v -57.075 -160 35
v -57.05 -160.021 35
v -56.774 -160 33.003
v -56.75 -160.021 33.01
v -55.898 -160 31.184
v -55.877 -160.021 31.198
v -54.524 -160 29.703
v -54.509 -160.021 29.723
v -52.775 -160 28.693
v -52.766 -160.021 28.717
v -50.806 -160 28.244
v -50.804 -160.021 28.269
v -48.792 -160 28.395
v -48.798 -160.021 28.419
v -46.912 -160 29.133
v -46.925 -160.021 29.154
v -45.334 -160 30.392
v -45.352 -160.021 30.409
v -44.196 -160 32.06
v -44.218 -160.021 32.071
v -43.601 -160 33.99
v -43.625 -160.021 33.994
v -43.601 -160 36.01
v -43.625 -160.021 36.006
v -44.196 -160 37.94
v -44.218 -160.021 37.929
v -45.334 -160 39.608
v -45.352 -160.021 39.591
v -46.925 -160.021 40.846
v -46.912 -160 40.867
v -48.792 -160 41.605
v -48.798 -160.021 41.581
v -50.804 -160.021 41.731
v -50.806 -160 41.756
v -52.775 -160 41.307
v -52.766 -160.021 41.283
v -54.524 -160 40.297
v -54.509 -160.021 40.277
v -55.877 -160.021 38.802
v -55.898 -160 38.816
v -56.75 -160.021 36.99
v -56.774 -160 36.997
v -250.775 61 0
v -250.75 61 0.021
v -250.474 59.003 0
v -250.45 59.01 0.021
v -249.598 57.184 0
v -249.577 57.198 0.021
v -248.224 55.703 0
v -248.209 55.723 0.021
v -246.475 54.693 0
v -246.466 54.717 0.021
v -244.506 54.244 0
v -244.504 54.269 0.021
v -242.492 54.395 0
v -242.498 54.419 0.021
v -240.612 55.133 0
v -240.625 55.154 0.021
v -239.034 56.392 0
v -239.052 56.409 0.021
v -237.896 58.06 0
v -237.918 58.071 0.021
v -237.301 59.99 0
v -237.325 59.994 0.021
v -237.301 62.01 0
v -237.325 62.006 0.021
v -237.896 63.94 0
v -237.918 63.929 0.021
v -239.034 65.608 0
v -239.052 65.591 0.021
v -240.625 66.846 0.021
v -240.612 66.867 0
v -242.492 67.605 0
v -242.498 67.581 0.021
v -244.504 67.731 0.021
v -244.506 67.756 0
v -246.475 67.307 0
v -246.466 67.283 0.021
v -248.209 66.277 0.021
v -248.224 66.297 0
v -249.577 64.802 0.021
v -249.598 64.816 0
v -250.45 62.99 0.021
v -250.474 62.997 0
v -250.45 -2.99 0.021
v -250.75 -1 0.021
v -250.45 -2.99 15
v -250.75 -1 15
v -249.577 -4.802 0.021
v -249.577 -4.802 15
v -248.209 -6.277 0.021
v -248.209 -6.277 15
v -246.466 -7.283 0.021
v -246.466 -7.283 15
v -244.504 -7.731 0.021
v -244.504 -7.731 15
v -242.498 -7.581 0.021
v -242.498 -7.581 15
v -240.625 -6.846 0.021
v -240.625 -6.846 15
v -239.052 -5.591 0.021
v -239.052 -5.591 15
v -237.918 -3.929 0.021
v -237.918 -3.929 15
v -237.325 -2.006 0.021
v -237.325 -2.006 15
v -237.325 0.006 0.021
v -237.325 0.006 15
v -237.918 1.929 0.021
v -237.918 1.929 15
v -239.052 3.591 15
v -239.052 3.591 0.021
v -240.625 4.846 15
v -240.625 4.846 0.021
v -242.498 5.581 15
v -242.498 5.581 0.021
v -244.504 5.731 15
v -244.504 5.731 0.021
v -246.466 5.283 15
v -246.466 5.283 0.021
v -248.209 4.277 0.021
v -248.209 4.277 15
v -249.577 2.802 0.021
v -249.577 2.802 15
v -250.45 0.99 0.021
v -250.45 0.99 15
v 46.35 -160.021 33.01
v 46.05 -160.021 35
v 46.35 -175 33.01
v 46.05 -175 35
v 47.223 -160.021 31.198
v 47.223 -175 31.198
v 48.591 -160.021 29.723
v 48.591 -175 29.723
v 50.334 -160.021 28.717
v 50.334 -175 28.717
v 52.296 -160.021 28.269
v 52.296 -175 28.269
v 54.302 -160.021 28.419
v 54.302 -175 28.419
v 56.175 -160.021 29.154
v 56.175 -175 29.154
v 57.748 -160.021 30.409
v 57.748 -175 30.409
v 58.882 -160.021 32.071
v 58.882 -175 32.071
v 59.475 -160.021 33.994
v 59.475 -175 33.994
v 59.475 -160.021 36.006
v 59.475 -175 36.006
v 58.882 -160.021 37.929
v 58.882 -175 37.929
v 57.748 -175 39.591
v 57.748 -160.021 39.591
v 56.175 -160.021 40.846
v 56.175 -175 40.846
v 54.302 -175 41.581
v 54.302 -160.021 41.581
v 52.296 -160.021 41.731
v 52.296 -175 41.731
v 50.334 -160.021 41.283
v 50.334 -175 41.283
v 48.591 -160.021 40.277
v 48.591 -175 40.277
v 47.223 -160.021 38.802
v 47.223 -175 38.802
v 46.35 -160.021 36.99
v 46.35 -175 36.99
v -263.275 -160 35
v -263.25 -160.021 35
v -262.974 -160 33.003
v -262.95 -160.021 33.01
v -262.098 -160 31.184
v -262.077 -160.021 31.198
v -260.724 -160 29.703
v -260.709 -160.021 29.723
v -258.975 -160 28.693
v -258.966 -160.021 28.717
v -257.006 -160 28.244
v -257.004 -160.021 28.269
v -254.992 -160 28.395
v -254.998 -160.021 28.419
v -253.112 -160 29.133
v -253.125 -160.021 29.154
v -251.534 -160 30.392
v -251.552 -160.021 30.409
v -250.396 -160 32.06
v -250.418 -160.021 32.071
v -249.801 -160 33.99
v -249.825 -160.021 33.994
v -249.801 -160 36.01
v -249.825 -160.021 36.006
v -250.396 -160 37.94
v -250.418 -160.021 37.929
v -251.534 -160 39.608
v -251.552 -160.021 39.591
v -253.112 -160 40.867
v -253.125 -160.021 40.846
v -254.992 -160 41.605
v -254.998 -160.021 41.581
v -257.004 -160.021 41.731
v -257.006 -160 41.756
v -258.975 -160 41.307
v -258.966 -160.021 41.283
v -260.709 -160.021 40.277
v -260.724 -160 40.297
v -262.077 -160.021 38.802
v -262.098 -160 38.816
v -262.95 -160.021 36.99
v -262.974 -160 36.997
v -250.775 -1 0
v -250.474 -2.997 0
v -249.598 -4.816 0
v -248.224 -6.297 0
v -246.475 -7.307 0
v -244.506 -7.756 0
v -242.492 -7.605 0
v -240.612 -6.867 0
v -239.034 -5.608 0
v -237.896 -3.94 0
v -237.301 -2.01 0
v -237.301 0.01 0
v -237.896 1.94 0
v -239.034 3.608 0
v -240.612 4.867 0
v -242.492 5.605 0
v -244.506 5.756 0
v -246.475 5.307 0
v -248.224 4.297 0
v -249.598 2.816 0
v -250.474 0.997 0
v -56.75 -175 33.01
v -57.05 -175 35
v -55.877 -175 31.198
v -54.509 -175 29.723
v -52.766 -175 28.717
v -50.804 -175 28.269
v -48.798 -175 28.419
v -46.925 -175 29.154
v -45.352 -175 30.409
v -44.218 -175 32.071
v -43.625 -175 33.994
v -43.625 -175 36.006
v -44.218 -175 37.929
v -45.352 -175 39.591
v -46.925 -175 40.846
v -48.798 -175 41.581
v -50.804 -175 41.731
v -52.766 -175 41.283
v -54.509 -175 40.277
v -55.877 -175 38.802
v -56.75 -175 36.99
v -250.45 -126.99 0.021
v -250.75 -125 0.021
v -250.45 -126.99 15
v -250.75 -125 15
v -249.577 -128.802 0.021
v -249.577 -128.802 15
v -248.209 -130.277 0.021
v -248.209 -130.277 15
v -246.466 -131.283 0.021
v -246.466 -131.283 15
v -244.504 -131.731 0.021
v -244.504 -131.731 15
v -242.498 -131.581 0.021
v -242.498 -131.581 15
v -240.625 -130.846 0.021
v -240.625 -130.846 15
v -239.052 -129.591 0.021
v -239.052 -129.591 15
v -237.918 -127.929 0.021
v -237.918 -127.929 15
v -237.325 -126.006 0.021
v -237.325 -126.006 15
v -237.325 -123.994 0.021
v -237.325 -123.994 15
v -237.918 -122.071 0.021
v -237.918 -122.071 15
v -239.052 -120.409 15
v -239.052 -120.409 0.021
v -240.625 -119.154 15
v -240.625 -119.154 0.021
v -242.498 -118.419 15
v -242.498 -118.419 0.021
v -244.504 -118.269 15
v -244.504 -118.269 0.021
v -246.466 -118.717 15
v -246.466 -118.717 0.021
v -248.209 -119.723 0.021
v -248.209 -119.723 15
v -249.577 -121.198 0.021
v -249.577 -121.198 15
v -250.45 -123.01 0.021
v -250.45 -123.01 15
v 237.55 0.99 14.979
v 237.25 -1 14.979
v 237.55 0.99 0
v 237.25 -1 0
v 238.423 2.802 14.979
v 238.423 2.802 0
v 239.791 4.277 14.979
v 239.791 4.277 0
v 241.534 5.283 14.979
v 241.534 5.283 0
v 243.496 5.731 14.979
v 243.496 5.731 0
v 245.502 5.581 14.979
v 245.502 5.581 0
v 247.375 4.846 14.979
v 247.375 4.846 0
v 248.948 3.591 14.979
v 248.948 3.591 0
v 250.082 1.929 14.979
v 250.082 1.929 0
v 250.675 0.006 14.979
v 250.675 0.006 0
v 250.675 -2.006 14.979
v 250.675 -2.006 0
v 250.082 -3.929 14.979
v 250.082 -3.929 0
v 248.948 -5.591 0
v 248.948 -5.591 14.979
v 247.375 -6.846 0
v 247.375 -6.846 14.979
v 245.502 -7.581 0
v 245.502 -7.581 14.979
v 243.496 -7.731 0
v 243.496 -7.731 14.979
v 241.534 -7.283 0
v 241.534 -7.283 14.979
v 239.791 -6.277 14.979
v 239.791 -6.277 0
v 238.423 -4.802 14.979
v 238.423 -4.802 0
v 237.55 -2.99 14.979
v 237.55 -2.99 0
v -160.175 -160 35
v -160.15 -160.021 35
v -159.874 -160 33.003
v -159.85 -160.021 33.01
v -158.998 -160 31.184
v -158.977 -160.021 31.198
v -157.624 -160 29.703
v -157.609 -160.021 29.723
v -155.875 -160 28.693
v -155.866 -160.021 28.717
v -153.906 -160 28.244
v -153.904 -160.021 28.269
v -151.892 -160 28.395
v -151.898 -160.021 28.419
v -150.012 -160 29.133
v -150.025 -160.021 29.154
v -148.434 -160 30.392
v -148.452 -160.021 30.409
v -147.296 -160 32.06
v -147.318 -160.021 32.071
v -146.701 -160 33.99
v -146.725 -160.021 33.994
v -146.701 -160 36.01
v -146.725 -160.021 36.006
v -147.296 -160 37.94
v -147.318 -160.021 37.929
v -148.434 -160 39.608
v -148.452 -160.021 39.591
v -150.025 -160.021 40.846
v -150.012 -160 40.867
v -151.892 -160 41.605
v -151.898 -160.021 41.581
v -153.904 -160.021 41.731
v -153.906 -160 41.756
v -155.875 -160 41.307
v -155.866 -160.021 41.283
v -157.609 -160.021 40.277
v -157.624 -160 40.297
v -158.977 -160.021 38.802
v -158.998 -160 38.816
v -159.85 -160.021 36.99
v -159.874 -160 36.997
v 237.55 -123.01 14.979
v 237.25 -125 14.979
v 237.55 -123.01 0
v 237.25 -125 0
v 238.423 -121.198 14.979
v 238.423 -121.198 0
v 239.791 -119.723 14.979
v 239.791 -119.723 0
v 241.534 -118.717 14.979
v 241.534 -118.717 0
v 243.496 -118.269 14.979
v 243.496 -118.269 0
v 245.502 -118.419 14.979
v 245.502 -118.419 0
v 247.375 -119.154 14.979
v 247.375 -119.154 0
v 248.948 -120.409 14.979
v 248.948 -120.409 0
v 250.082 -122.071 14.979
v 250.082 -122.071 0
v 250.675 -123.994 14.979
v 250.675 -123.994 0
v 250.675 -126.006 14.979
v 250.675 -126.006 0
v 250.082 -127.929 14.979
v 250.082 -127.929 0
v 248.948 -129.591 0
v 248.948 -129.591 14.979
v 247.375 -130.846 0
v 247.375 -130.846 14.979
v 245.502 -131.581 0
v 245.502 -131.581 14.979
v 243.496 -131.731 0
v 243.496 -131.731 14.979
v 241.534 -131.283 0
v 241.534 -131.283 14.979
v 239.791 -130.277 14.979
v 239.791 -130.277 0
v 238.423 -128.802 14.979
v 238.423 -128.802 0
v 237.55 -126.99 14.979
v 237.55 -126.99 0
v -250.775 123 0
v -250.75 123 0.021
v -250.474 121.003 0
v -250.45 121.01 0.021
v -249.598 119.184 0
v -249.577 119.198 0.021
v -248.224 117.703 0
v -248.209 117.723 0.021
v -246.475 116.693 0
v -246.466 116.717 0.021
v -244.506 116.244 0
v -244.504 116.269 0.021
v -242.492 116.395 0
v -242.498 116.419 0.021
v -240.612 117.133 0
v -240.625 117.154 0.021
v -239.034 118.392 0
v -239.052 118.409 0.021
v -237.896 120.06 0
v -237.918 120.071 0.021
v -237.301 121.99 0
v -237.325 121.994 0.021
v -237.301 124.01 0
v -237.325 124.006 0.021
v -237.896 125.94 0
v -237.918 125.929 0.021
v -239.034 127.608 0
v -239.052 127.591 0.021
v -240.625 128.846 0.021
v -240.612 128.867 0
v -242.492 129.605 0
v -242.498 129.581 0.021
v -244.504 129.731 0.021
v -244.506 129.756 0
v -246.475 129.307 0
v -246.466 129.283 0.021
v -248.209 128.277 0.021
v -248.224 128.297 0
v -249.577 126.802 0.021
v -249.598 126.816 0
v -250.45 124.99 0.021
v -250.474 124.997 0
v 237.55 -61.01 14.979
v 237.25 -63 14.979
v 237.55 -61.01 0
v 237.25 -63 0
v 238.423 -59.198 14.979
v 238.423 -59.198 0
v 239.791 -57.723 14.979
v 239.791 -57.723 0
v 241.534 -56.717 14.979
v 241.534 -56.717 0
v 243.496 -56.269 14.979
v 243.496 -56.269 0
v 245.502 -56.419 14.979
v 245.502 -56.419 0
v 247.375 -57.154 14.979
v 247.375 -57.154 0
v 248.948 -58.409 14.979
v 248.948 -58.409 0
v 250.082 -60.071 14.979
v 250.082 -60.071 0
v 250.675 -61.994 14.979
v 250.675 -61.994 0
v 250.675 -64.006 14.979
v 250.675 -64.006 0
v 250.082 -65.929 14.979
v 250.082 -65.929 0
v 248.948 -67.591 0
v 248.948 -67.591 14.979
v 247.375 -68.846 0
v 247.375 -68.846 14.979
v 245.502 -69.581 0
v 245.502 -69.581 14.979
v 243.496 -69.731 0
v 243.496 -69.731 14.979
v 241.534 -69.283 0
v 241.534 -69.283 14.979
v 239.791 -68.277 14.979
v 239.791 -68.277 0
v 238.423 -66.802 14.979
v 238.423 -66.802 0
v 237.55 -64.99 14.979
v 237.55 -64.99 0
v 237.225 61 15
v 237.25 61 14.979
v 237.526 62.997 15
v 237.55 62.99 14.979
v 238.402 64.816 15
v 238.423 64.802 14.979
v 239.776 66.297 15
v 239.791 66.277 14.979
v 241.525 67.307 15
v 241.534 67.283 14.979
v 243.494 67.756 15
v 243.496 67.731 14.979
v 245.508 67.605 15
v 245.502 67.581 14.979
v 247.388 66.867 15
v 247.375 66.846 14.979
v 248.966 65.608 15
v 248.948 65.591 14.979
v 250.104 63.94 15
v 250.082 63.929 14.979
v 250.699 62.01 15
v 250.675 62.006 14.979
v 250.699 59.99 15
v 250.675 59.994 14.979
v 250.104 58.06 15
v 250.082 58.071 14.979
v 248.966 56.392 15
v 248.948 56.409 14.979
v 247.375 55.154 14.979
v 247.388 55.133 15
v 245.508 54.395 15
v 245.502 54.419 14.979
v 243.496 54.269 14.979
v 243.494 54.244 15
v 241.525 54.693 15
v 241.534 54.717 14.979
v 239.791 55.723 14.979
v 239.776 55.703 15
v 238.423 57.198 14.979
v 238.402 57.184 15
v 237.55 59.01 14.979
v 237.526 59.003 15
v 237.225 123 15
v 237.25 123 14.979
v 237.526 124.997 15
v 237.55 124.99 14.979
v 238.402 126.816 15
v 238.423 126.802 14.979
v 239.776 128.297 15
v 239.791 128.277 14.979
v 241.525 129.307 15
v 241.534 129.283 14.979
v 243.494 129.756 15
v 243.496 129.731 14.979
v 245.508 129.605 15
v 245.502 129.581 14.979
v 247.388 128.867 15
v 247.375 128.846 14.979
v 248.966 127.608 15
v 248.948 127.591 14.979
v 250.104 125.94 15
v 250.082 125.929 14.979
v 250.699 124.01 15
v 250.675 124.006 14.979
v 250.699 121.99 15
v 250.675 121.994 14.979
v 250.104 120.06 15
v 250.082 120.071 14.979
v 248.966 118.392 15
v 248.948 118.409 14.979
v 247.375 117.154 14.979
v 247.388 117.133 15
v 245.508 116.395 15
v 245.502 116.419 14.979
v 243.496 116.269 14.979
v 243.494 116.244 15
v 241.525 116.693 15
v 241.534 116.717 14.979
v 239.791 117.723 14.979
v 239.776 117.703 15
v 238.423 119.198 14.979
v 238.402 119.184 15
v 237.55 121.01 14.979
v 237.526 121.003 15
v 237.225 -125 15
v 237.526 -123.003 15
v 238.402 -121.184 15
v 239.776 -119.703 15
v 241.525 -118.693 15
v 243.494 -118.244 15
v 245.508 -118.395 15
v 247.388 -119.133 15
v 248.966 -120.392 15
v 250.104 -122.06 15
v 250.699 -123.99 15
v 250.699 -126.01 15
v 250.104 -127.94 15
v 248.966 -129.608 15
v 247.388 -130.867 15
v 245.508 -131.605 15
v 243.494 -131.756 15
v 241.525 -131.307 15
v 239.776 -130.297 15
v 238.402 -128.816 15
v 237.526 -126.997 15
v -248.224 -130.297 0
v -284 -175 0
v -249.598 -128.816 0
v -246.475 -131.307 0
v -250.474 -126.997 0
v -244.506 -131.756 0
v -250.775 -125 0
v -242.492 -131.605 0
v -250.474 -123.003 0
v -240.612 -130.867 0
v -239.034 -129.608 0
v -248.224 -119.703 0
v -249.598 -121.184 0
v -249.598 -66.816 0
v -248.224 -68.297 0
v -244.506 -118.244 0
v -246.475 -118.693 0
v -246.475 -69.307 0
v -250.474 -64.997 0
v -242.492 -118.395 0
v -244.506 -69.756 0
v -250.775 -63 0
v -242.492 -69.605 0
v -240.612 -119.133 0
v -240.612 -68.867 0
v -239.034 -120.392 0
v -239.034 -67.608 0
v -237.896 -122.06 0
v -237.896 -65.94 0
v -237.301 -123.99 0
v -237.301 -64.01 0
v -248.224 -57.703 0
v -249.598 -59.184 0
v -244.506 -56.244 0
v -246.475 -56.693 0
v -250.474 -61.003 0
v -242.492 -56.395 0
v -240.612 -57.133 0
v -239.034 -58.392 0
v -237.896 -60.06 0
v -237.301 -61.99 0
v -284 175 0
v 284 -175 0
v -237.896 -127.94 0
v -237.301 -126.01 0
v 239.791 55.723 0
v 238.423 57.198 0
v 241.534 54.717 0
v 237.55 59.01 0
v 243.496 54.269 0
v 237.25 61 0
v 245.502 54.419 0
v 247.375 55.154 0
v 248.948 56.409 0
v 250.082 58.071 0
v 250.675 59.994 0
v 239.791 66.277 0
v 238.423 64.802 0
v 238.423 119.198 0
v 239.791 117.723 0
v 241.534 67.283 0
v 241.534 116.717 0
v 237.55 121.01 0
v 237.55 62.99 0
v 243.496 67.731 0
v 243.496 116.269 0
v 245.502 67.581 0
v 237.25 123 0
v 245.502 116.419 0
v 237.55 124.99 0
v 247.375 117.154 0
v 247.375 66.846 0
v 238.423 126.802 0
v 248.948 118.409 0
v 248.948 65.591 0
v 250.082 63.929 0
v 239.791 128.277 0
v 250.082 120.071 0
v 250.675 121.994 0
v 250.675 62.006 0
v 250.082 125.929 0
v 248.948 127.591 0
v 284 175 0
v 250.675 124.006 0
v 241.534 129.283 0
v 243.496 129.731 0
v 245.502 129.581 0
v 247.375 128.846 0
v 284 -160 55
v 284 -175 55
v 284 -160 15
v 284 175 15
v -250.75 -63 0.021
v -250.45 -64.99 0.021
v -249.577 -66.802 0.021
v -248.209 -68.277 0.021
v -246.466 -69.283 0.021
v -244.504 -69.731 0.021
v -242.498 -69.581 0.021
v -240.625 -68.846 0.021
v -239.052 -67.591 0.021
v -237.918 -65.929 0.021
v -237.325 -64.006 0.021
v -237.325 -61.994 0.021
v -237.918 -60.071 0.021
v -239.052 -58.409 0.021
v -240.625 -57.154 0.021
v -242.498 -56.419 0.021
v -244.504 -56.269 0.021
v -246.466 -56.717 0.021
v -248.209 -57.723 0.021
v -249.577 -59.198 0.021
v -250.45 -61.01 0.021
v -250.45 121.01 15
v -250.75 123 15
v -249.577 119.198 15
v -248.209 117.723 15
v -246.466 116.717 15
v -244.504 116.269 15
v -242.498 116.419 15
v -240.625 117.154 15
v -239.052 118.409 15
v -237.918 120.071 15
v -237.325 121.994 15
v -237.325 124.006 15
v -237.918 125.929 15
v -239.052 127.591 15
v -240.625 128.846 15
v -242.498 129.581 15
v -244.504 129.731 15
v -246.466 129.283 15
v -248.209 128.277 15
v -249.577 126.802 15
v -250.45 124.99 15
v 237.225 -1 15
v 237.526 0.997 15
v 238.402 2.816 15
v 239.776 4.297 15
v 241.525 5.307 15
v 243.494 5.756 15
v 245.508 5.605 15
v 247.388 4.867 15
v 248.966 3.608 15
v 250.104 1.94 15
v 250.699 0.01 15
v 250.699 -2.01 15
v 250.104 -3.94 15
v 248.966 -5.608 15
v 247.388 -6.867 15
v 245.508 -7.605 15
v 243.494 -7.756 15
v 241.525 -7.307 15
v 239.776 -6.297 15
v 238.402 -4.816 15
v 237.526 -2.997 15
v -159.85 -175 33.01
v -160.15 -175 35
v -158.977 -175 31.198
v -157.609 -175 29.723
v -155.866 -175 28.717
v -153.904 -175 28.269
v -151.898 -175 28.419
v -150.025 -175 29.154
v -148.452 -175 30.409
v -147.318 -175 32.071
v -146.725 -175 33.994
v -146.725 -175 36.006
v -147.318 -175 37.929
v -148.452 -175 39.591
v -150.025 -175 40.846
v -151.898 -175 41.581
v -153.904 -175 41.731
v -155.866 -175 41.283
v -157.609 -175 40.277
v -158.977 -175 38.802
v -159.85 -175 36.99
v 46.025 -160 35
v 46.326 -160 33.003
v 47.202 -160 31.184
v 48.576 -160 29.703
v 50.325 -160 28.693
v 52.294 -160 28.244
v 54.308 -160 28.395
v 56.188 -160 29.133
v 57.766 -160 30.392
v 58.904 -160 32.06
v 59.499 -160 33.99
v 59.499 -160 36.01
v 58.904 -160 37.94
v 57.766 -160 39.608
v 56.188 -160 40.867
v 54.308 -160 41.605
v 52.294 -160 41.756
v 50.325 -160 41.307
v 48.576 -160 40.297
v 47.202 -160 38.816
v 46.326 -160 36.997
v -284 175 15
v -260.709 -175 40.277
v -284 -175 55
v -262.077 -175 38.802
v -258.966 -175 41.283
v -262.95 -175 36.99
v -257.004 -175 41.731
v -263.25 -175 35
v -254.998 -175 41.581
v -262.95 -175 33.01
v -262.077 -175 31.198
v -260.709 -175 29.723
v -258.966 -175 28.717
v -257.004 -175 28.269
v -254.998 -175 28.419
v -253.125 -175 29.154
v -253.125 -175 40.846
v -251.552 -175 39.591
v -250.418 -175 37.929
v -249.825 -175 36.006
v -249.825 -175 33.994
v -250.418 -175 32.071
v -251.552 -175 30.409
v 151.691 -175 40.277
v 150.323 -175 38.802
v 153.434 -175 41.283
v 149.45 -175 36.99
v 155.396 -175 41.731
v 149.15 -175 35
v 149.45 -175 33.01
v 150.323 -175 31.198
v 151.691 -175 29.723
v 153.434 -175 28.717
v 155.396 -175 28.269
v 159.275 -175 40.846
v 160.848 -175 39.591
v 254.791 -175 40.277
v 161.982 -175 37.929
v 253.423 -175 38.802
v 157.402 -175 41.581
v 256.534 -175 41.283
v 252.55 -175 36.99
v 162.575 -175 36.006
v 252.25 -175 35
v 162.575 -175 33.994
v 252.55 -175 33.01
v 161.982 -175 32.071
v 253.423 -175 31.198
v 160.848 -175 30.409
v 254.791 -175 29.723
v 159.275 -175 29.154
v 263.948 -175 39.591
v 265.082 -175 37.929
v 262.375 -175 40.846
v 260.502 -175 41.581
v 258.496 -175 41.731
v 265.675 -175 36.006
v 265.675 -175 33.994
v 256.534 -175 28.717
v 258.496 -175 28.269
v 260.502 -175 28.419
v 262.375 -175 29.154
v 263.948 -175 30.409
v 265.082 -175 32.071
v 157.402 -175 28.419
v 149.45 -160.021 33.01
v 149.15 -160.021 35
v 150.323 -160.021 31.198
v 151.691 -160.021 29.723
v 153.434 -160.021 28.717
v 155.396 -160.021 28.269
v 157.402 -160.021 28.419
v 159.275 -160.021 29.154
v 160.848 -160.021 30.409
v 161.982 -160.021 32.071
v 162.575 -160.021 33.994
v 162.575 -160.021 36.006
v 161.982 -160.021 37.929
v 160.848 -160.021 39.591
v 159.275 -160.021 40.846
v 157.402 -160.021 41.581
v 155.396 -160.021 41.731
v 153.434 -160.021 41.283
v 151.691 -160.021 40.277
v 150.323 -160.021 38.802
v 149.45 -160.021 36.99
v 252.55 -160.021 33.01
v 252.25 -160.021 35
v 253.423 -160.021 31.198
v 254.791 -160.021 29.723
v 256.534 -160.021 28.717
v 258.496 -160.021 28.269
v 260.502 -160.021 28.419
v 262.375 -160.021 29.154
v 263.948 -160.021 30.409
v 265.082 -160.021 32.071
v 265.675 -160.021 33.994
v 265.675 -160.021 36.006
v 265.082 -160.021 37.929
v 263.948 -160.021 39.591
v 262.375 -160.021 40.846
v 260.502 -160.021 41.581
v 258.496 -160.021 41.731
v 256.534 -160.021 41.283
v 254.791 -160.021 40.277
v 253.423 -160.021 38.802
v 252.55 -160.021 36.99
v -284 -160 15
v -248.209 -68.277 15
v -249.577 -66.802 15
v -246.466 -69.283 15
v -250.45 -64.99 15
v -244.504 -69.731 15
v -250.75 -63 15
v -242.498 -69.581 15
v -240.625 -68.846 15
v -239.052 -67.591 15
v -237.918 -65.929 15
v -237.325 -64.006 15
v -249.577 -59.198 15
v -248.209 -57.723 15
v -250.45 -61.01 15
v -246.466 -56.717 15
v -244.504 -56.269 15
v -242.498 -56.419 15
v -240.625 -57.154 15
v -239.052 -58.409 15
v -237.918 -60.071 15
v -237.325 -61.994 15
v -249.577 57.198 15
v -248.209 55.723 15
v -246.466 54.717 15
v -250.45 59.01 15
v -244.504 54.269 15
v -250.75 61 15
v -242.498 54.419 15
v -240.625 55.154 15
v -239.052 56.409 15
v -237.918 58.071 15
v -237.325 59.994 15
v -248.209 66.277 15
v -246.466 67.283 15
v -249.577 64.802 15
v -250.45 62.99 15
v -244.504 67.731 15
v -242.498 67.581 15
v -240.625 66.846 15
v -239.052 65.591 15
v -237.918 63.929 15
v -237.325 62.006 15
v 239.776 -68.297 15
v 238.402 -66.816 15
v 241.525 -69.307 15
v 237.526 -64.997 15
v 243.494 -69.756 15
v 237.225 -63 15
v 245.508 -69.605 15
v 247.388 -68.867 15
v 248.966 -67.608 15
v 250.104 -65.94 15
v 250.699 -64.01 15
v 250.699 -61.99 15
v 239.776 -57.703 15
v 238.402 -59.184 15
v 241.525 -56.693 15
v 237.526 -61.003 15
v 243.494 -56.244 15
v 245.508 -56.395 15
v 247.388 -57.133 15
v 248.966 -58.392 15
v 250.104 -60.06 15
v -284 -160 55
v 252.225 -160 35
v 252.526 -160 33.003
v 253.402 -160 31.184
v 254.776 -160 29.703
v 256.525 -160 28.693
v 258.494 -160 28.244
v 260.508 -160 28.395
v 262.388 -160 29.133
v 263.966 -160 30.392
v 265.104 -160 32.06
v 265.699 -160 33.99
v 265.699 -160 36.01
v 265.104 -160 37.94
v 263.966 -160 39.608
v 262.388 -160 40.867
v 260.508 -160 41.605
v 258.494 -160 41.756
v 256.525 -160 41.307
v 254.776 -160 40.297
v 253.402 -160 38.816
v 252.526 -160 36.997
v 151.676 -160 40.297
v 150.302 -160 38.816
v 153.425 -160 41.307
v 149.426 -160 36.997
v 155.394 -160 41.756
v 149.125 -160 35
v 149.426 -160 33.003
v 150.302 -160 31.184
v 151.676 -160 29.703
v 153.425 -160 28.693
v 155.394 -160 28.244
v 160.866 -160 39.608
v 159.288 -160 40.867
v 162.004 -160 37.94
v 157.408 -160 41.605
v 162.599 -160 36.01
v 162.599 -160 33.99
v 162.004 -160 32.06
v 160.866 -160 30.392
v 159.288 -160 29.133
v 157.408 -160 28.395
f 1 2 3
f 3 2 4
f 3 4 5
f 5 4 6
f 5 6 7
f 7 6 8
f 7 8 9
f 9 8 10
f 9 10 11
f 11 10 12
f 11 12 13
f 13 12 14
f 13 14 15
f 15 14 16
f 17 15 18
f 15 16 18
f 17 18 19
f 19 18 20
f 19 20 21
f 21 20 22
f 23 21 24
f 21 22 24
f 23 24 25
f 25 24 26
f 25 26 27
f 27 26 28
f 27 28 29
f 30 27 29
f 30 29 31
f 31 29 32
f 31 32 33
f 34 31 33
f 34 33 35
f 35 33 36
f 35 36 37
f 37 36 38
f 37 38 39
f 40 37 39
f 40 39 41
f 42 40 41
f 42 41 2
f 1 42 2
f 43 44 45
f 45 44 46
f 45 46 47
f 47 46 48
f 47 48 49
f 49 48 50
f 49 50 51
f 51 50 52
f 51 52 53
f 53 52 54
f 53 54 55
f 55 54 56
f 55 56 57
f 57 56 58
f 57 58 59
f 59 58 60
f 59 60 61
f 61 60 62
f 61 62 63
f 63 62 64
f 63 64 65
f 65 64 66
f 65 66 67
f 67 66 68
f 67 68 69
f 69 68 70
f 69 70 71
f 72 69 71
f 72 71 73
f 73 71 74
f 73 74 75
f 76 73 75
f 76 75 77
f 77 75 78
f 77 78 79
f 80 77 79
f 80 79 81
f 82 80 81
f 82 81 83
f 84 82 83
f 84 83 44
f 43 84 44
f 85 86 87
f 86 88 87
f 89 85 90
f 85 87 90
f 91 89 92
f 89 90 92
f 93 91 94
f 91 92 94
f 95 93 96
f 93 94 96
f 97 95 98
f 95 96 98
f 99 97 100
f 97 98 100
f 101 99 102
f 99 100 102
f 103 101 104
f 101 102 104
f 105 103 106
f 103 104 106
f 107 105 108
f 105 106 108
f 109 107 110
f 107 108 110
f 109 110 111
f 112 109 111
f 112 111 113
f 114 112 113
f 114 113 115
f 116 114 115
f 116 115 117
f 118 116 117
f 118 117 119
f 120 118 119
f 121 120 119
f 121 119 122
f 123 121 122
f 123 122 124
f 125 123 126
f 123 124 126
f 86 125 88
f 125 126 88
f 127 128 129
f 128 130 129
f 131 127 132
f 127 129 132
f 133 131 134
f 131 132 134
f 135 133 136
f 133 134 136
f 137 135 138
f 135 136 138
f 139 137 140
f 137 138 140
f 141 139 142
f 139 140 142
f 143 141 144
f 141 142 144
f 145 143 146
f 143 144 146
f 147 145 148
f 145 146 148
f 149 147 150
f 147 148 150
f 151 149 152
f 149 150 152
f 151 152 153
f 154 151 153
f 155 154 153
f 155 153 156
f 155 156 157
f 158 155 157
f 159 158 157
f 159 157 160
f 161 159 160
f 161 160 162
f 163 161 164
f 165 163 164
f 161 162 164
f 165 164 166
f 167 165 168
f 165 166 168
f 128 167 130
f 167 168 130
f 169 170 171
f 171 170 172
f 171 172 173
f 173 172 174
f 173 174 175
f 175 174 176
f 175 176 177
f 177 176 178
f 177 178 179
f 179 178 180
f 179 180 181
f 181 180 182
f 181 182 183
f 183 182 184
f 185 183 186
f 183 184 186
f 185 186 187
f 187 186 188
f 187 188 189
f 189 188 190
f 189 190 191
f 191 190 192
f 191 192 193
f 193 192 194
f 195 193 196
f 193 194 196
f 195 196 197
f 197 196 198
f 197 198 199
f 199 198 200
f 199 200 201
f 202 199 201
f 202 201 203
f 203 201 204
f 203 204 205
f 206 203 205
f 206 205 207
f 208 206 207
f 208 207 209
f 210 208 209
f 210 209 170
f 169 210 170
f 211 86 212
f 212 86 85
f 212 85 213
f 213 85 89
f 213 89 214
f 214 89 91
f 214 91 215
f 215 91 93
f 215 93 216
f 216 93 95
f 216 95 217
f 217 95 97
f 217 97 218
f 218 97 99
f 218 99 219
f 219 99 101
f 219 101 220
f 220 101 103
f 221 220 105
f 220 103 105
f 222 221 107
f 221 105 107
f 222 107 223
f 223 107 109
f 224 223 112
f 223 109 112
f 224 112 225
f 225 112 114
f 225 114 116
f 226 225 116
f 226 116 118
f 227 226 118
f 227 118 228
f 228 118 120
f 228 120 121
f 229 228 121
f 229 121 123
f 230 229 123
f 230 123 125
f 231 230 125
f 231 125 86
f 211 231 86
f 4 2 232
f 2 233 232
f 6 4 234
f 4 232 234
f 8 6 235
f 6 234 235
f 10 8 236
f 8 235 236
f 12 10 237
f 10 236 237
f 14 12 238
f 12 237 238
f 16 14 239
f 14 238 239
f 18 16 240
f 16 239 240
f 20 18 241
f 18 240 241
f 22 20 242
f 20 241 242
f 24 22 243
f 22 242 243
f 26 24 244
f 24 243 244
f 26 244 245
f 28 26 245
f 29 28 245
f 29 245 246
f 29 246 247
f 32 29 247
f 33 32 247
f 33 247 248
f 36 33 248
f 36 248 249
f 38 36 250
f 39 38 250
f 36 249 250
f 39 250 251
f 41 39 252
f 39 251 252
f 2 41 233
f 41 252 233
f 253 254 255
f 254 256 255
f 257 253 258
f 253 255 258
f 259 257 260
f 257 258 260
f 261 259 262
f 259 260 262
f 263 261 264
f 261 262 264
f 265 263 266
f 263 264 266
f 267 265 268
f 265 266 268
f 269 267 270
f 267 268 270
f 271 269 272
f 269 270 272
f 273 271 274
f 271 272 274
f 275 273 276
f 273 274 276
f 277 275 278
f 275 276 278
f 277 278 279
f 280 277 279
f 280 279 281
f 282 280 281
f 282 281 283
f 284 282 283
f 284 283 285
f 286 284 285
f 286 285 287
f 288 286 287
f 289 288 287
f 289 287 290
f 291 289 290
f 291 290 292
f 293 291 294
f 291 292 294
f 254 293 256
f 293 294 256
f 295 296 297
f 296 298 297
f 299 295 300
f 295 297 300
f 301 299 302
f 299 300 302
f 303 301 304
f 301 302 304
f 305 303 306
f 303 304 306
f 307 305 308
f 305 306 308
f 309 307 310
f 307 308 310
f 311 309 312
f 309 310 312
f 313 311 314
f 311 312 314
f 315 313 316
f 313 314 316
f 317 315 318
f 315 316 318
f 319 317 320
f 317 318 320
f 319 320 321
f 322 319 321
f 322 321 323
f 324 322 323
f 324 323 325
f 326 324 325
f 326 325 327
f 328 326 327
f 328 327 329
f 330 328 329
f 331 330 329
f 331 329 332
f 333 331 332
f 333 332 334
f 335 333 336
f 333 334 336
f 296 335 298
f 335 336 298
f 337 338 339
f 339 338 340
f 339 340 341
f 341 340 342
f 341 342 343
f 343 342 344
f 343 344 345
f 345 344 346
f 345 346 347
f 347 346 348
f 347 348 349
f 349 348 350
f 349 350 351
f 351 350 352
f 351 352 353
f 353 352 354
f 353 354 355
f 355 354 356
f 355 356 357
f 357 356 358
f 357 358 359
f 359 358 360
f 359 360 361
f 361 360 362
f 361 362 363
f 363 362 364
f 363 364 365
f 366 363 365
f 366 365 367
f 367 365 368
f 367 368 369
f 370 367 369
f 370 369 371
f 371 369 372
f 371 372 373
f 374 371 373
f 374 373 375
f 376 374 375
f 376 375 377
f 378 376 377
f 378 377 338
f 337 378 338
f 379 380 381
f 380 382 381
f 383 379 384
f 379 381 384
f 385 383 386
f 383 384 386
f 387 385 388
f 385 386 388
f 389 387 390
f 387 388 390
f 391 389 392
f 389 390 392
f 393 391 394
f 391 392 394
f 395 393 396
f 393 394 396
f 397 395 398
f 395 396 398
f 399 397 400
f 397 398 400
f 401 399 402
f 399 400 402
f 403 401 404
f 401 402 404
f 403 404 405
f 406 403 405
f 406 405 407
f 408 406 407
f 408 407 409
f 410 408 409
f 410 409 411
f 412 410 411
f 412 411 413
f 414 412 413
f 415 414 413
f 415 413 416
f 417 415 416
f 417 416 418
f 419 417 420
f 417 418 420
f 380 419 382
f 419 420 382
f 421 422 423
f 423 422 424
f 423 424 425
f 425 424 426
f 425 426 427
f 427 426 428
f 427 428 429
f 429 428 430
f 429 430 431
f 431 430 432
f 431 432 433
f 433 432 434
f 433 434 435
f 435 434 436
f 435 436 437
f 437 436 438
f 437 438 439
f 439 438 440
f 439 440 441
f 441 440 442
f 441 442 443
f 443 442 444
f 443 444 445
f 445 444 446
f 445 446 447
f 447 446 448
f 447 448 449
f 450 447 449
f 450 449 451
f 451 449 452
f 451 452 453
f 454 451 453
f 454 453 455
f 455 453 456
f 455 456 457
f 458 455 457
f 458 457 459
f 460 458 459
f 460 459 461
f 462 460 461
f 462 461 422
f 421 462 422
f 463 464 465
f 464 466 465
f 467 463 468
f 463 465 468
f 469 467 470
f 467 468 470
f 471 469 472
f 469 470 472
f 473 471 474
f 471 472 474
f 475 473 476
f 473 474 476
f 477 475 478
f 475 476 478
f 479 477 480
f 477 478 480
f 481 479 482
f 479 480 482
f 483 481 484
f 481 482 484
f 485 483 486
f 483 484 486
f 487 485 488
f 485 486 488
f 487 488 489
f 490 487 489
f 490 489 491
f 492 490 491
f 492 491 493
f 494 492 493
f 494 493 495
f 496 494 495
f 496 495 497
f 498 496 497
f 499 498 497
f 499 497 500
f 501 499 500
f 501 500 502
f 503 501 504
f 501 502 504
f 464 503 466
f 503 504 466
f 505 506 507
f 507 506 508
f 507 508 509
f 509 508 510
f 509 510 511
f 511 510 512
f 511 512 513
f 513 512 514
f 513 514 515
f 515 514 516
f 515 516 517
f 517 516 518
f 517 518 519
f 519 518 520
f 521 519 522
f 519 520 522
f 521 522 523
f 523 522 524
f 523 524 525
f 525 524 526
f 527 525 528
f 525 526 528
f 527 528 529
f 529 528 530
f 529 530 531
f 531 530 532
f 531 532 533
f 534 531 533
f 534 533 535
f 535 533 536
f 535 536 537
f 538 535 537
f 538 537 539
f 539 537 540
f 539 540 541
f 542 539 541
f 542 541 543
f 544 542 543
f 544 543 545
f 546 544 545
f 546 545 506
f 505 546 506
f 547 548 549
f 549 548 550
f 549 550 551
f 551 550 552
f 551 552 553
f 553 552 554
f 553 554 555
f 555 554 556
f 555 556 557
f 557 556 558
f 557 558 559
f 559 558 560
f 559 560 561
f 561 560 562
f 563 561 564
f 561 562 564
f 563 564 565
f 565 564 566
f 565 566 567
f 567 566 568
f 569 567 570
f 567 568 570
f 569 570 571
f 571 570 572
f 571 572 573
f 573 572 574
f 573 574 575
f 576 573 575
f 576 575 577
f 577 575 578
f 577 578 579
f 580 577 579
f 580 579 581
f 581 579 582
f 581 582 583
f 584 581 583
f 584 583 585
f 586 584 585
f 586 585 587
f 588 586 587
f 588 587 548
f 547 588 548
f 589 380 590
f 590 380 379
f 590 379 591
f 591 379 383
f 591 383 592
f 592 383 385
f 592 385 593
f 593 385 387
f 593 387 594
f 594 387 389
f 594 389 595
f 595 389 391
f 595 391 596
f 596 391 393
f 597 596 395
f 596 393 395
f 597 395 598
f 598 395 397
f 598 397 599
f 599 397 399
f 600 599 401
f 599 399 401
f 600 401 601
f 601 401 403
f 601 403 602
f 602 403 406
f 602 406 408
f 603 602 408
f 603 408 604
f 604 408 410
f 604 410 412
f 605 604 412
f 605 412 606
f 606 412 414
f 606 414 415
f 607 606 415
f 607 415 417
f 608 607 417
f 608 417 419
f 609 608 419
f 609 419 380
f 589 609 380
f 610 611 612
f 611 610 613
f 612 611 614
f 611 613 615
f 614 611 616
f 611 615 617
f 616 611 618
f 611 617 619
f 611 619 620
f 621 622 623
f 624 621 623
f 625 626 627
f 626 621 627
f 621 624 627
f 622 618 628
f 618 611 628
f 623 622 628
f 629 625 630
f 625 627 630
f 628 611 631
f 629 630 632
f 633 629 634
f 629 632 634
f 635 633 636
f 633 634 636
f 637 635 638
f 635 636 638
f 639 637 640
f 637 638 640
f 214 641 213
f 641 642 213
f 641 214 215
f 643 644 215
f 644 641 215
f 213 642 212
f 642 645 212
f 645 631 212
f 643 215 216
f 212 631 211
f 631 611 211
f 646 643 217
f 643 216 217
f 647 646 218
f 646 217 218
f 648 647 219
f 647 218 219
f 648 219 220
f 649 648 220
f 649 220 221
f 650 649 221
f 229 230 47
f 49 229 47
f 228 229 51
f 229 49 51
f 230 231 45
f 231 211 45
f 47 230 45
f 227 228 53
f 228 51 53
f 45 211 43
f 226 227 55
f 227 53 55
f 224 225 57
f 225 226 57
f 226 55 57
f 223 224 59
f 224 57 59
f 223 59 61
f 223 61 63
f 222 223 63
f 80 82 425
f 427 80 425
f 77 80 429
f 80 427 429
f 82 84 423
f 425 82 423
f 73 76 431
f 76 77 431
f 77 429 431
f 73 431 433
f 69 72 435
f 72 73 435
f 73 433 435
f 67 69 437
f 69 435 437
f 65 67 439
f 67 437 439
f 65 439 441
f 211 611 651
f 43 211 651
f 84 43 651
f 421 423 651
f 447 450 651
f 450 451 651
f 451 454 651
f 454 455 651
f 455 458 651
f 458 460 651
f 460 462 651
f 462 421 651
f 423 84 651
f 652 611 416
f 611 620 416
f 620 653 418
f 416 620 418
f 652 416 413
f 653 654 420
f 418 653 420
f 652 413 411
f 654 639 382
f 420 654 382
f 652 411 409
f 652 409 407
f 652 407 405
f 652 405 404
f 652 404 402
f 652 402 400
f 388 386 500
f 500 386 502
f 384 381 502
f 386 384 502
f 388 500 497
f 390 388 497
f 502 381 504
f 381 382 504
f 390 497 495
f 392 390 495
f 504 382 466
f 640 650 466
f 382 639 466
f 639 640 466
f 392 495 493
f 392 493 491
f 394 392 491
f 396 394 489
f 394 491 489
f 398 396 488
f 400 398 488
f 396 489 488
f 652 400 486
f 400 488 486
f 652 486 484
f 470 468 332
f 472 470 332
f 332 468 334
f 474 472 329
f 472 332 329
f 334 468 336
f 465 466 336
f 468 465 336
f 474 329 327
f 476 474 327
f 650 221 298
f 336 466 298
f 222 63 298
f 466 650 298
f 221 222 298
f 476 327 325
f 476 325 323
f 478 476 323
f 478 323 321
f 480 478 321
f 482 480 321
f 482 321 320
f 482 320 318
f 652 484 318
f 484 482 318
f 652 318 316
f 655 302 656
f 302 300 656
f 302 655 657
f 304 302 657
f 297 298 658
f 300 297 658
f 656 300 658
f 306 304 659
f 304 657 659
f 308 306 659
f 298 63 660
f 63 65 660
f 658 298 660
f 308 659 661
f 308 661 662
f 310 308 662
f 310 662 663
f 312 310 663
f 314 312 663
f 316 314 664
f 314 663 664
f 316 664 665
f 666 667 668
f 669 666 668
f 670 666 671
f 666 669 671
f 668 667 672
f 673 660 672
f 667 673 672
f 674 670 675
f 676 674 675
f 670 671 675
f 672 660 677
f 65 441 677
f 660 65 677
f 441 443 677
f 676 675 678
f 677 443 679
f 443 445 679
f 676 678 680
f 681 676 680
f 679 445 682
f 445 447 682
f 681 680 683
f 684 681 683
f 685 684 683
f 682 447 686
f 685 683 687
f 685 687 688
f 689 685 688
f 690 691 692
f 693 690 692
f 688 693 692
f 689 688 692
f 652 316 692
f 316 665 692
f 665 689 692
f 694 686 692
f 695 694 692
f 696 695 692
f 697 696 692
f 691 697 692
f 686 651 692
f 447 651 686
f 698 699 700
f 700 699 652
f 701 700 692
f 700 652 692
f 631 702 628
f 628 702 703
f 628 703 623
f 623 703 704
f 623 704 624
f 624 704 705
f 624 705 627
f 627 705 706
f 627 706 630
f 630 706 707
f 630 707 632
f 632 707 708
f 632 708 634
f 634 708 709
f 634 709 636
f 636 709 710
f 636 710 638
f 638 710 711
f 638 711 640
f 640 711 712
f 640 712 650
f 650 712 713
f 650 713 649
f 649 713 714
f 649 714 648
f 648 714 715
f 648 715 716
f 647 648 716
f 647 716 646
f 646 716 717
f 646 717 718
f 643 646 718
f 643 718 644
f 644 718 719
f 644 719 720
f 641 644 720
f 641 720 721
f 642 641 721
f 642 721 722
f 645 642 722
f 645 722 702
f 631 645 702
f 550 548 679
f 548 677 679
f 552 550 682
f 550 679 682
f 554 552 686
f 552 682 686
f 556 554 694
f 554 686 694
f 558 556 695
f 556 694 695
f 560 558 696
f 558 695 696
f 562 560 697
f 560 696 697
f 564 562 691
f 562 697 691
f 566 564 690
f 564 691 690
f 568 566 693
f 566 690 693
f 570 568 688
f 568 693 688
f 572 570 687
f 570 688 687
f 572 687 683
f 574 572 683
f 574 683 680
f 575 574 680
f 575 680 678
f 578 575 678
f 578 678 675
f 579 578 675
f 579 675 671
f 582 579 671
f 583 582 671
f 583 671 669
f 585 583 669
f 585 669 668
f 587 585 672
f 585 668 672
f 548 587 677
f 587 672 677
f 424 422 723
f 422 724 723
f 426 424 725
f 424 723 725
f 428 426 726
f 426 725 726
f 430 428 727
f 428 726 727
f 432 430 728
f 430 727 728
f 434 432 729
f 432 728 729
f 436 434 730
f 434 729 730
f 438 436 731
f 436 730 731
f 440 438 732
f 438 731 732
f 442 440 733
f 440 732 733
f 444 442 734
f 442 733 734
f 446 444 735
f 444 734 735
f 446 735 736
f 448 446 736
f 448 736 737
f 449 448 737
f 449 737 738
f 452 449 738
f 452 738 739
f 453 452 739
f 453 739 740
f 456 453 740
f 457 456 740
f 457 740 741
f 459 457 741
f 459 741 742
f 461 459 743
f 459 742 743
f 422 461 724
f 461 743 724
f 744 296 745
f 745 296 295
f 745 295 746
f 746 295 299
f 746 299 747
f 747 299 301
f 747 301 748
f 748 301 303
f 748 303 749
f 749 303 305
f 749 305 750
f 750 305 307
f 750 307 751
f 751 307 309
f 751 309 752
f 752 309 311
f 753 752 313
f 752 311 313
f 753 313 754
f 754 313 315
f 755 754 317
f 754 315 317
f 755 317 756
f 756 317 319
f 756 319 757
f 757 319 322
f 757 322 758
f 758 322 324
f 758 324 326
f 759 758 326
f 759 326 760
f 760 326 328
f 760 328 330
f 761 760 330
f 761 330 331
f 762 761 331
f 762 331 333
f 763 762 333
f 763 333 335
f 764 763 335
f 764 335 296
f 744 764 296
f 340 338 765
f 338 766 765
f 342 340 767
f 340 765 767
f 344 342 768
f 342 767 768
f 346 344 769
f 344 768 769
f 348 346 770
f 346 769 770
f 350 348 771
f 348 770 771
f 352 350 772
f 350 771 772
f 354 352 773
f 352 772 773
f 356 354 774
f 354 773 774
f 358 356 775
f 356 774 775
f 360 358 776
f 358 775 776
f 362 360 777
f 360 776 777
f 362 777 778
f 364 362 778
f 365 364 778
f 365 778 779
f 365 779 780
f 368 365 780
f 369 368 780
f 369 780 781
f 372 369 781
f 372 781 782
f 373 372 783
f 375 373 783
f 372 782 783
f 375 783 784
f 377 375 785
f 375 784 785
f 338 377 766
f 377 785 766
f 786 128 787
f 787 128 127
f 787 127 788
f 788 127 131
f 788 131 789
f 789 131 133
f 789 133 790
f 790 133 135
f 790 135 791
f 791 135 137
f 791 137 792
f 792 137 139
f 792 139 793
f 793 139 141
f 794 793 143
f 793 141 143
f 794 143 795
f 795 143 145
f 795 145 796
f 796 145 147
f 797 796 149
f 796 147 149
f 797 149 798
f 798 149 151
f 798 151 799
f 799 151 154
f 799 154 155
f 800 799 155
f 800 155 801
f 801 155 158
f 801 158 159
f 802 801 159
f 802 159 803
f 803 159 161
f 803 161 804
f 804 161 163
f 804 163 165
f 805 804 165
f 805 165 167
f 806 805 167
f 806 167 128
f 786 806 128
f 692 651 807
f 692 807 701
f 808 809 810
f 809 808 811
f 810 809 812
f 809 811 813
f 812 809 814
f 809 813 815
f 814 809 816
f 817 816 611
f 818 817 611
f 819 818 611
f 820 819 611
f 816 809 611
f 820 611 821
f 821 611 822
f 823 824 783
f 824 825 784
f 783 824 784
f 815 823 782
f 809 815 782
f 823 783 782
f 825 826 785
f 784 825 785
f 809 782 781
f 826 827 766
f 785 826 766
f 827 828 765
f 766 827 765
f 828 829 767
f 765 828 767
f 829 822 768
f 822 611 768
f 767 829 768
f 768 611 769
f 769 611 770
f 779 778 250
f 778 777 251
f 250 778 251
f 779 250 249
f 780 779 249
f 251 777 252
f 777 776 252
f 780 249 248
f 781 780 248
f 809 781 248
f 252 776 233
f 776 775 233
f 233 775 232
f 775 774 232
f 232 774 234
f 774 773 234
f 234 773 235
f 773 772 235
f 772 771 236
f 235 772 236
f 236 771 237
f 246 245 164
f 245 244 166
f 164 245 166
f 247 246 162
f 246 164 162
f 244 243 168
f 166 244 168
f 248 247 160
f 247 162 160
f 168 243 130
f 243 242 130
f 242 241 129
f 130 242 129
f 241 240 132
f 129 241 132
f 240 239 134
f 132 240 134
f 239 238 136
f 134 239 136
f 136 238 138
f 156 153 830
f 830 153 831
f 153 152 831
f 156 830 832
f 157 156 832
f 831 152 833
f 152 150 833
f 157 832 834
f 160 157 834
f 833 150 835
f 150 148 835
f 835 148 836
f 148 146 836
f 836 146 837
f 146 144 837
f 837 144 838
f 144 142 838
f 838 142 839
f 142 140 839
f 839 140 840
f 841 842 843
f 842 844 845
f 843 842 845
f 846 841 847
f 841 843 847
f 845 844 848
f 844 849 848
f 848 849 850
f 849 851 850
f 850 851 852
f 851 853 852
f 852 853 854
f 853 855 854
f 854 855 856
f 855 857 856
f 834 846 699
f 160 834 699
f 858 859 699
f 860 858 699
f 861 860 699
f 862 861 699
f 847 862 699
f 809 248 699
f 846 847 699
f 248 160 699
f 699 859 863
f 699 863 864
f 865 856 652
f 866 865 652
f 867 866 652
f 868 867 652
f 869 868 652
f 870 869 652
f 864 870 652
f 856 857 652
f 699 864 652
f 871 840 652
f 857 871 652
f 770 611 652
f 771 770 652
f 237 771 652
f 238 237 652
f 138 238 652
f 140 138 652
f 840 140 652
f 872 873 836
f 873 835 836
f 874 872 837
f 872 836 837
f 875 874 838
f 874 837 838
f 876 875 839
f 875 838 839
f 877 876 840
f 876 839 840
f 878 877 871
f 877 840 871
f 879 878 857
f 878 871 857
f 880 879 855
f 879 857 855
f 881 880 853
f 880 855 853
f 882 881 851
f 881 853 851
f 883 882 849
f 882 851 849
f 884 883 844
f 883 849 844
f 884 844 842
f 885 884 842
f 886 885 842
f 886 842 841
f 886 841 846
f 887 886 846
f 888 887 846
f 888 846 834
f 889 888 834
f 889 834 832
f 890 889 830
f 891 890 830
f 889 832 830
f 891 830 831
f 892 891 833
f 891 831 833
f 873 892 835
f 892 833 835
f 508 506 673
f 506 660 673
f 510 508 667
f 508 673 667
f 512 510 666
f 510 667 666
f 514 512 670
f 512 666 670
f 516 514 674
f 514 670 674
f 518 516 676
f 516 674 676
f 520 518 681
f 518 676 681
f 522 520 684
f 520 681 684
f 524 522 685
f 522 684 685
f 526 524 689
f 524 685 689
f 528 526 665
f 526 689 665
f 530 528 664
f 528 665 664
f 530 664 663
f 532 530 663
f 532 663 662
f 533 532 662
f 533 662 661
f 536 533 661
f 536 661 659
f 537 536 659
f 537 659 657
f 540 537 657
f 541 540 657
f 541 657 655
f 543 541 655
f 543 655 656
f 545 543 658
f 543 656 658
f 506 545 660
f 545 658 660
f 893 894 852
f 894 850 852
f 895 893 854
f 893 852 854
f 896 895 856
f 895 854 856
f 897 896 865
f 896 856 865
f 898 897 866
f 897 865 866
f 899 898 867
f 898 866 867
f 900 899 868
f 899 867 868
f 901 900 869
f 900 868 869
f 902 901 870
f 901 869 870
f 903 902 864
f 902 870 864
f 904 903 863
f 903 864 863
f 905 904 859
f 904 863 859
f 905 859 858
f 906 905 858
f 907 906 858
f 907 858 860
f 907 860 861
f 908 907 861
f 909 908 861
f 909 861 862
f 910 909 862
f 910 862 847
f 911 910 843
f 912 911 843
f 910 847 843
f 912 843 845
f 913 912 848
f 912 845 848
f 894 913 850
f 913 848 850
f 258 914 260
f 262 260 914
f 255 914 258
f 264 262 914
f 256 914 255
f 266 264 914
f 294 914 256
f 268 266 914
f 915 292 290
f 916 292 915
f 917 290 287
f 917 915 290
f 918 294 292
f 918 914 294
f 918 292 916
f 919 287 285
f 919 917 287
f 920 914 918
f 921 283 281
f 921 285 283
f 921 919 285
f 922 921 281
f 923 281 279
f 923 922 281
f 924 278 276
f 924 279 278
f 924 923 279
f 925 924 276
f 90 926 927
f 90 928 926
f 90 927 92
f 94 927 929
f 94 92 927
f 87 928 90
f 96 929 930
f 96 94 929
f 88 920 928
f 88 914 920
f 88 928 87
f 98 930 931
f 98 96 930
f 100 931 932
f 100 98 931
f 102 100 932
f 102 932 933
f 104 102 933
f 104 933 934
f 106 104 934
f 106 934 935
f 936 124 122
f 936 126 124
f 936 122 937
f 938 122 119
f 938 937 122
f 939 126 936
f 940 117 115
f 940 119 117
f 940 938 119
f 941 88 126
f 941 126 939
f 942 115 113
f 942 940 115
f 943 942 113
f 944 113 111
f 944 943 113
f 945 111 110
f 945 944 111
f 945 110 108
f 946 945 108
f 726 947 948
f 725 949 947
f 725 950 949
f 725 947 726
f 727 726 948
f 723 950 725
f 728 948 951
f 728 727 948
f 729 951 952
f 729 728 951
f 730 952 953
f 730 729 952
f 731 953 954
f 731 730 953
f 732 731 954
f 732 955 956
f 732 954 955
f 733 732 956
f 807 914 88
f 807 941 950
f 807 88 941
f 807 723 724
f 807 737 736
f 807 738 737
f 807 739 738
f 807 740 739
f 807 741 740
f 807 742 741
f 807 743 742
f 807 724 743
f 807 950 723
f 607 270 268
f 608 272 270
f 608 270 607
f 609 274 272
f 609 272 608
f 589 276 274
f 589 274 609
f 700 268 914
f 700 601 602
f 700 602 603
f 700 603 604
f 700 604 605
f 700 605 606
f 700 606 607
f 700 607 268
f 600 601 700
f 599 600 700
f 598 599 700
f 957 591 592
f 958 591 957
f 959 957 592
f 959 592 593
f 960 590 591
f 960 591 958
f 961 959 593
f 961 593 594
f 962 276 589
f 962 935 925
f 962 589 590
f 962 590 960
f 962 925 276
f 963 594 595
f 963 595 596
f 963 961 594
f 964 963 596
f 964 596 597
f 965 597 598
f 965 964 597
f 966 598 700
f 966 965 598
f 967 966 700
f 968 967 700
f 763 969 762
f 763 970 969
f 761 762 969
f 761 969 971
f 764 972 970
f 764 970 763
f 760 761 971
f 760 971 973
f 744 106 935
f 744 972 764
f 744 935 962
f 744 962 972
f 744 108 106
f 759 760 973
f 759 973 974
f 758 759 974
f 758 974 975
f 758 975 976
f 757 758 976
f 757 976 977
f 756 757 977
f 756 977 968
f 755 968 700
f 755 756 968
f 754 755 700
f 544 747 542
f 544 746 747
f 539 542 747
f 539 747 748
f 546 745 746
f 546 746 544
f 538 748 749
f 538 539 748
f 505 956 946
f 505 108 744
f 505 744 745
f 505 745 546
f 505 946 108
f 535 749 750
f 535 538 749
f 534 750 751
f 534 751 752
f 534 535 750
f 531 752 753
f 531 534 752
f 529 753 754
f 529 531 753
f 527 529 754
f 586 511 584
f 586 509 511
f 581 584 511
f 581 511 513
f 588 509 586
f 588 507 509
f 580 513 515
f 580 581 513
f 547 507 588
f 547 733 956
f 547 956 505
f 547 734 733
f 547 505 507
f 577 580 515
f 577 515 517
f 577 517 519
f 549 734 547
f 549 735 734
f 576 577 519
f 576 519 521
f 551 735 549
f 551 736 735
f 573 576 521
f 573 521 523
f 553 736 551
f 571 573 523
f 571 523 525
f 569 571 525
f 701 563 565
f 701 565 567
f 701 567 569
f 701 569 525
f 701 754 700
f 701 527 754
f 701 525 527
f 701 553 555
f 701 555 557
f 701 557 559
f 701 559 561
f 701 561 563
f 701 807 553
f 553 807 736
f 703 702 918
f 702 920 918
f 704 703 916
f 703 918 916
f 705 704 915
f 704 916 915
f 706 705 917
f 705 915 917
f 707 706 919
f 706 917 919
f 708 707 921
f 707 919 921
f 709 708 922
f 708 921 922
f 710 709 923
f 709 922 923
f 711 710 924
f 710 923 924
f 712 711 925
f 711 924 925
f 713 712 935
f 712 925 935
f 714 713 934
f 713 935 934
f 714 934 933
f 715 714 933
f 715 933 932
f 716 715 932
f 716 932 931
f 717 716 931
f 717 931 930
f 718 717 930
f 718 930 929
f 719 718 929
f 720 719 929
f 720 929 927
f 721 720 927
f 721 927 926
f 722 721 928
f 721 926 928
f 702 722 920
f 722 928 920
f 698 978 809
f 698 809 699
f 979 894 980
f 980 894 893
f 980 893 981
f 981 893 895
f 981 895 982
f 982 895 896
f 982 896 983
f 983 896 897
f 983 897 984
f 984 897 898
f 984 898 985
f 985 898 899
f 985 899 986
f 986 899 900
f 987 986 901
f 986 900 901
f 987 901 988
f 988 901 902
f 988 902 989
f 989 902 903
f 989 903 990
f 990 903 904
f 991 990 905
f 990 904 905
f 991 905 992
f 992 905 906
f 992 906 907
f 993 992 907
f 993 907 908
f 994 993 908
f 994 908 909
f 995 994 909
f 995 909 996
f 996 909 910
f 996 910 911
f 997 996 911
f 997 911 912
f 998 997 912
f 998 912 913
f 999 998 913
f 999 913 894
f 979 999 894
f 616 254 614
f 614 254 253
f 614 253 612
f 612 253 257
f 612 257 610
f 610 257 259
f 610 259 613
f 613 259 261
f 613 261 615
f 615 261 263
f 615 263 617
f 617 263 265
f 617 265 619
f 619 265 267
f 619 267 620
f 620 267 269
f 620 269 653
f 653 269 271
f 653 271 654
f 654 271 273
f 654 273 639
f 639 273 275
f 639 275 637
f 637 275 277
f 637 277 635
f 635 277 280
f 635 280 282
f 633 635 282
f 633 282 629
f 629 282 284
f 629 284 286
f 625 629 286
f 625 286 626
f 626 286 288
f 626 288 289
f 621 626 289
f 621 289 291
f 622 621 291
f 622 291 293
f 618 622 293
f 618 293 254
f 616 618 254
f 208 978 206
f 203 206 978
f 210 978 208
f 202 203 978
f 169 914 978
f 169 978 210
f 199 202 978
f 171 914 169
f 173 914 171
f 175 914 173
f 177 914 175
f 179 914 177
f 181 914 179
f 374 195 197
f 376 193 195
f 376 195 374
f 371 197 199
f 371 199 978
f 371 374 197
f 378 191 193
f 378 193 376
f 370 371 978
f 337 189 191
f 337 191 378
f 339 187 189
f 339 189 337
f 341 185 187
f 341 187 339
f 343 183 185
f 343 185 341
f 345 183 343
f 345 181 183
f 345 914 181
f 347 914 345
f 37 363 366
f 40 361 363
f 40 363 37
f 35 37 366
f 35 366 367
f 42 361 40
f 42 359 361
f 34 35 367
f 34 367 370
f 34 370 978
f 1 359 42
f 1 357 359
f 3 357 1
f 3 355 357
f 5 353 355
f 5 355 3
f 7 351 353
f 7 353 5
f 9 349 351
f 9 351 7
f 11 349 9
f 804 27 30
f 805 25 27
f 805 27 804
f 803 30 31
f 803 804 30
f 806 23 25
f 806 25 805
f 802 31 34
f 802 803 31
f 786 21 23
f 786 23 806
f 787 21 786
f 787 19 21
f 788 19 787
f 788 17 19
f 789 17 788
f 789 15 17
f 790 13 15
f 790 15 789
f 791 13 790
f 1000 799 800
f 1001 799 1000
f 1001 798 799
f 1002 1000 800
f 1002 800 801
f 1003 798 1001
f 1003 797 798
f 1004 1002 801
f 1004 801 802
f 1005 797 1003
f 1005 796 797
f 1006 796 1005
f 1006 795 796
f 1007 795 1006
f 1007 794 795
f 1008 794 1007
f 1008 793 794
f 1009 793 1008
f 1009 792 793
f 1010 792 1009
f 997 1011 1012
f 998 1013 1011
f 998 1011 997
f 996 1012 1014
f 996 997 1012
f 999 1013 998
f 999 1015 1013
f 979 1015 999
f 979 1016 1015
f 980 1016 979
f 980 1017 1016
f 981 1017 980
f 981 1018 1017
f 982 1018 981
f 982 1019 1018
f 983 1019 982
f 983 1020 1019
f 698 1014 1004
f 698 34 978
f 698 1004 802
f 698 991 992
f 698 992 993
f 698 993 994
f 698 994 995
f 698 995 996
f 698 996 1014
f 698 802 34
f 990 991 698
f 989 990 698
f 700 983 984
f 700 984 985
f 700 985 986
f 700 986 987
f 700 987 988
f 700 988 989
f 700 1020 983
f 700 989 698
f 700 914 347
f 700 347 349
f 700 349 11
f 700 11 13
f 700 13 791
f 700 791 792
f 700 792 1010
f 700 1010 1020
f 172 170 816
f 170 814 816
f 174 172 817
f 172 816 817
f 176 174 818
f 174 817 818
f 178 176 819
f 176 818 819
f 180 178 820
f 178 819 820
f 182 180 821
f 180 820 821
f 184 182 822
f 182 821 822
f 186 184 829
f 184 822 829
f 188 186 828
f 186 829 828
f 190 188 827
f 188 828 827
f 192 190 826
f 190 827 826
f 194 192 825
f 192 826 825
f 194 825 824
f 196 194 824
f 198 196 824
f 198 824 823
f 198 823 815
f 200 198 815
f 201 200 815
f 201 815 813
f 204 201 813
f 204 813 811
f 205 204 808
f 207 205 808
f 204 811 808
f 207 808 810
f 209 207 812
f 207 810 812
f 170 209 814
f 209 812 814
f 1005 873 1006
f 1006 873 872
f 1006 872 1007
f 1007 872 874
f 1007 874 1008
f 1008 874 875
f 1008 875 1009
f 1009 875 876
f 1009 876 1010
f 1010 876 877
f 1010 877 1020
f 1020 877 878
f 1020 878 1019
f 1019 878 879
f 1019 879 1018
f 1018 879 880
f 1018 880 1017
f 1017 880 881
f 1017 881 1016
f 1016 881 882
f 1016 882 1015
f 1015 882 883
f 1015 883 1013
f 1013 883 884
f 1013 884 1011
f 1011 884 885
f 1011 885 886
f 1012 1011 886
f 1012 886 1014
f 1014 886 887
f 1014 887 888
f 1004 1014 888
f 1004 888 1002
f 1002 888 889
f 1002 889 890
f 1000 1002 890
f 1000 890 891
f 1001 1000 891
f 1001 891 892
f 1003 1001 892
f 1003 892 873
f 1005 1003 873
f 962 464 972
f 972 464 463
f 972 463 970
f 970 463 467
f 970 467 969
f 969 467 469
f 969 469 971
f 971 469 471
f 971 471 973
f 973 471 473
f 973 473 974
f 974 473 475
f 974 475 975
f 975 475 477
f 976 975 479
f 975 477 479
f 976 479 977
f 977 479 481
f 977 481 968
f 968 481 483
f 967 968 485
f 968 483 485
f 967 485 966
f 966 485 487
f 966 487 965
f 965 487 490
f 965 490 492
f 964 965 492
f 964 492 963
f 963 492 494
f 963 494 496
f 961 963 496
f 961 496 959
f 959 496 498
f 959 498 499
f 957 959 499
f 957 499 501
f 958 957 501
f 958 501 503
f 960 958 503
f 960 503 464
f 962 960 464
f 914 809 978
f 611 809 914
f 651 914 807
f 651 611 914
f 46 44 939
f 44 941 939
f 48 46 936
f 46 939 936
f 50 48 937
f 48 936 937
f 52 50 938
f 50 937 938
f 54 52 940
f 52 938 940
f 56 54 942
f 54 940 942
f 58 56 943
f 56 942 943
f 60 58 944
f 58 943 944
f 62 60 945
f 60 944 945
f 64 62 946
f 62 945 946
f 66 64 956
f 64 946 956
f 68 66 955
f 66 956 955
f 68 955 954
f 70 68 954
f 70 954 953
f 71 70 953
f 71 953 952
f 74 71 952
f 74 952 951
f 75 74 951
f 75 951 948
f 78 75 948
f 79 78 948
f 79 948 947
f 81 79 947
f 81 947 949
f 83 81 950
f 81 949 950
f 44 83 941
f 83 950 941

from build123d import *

# Parameters (mm, degrees)
SKETCH1_W                       = 568
SKETCH1_H                       = 350
BOSS_EXTRUDE1_DEPTH             = 15
SKETCH4_W                       = 568
SKETCH4_H                       = 15
BOSS_EXTRUDE3_DEPTH             = 40
M12_CLEARANCE_HOLE2_D           = 13.5
M12_CLEARANCE_HOLE2_CSINK_D     = 13.55
M12_CLEARANCE_HOLE2_CSINK_ANGLE = 100
LPATTERN1_COUNT                 = 5
LPATTERN1_PITCH                 = 62
M12_CLEARANCE_HOLE3_D           = 13.5
M12_CLEARANCE_HOLE3_CSINK_D     = 13.55
M12_CLEARANCE_HOLE3_CSINK_ANGLE = 100
LPATTERN2_COUNT                 = 5
LPATTERN2_PITCH                 = 62
M12_CLEARANCE_HOLE4_D           = 13.5
M12_CLEARANCE_HOLE4_CSINK_D     = 13.55
M12_CLEARANCE_HOLE4_CSINK_ANGLE = 100
LPATTERN3_COUNT                 = 6
LPATTERN3_PITCH                 = 103.1


with BuildPart() as part:
    # Sketch1 → Boss-Extrude1 (new body)
    with BuildSketch(Plane.XY):
        Rectangle(SKETCH1_W, SKETCH1_H)
    extrude(amount=BOSS_EXTRUDE1_DEPTH)

    # Sketch4 → Boss-Extrude3 (add)
    with BuildSketch(Plane.XY.offset(15)):
        with Locations((0, -167.5)):
            Rectangle(SKETCH4_W, SKETCH4_H)
    extrude(amount=BOSS_EXTRUDE3_DEPTH)

    # M12 Clearance Hole2 (through all)
    with Locations(Plane.XY.offset(15)):
        with Locations((244, 123)):
            m12_clearance_hole2 = CounterSinkHole(M12_CLEARANCE_HOLE2_D / 2, M12_CLEARANCE_HOLE2_CSINK_D / 2, counter_sink_angle=M12_CLEARANCE_HOLE2_CSINK_ANGLE)

    # LPattern1: M12 Clearance Hole2 ×5
    with Locations(*[(0, -i * LPATTERN1_PITCH, 0) for i in range(1, LPATTERN1_COUNT)]):
        add(m12_clearance_hole2, mode=Mode.SUBTRACT)

    # M12 Clearance Hole3 (through all)
    with Locations(Plane(origin=(0, 0, 0), x_dir=(1, 0, 0), z_dir=(0, 0, -1))):
        with Locations((-244, -123)):
            m12_clearance_hole3 = CounterSinkHole(M12_CLEARANCE_HOLE3_D / 2, M12_CLEARANCE_HOLE3_CSINK_D / 2, counter_sink_angle=M12_CLEARANCE_HOLE3_CSINK_ANGLE)

    # LPattern2: M12 Clearance Hole3 ×5
    with Locations(*[(0, -i * LPATTERN2_PITCH, 0) for i in range(1, LPATTERN2_COUNT)]):
        add(m12_clearance_hole3, mode=Mode.SUBTRACT)

    # M12 Clearance Hole4 (through all)
    with Locations(Plane(origin=(0, -160, 0), x_dir=(1, 0, 0), z_dir=(0, 1, 0))):
        with Locations((259, -35)):
            m12_clearance_hole4 = CounterSinkHole(M12_CLEARANCE_HOLE4_D / 2, M12_CLEARANCE_HOLE4_CSINK_D / 2, counter_sink_angle=M12_CLEARANCE_HOLE4_CSINK_ANGLE)

    # LPattern3: M12 Clearance Hole4 ×6
    with Locations(*[(-i * LPATTERN3_PITCH, 0, 0) for i in range(1, LPATTERN3_COUNT)]):
        add(m12_clearance_hole4, mode=Mode.SUBTRACT)


solid = part.part
